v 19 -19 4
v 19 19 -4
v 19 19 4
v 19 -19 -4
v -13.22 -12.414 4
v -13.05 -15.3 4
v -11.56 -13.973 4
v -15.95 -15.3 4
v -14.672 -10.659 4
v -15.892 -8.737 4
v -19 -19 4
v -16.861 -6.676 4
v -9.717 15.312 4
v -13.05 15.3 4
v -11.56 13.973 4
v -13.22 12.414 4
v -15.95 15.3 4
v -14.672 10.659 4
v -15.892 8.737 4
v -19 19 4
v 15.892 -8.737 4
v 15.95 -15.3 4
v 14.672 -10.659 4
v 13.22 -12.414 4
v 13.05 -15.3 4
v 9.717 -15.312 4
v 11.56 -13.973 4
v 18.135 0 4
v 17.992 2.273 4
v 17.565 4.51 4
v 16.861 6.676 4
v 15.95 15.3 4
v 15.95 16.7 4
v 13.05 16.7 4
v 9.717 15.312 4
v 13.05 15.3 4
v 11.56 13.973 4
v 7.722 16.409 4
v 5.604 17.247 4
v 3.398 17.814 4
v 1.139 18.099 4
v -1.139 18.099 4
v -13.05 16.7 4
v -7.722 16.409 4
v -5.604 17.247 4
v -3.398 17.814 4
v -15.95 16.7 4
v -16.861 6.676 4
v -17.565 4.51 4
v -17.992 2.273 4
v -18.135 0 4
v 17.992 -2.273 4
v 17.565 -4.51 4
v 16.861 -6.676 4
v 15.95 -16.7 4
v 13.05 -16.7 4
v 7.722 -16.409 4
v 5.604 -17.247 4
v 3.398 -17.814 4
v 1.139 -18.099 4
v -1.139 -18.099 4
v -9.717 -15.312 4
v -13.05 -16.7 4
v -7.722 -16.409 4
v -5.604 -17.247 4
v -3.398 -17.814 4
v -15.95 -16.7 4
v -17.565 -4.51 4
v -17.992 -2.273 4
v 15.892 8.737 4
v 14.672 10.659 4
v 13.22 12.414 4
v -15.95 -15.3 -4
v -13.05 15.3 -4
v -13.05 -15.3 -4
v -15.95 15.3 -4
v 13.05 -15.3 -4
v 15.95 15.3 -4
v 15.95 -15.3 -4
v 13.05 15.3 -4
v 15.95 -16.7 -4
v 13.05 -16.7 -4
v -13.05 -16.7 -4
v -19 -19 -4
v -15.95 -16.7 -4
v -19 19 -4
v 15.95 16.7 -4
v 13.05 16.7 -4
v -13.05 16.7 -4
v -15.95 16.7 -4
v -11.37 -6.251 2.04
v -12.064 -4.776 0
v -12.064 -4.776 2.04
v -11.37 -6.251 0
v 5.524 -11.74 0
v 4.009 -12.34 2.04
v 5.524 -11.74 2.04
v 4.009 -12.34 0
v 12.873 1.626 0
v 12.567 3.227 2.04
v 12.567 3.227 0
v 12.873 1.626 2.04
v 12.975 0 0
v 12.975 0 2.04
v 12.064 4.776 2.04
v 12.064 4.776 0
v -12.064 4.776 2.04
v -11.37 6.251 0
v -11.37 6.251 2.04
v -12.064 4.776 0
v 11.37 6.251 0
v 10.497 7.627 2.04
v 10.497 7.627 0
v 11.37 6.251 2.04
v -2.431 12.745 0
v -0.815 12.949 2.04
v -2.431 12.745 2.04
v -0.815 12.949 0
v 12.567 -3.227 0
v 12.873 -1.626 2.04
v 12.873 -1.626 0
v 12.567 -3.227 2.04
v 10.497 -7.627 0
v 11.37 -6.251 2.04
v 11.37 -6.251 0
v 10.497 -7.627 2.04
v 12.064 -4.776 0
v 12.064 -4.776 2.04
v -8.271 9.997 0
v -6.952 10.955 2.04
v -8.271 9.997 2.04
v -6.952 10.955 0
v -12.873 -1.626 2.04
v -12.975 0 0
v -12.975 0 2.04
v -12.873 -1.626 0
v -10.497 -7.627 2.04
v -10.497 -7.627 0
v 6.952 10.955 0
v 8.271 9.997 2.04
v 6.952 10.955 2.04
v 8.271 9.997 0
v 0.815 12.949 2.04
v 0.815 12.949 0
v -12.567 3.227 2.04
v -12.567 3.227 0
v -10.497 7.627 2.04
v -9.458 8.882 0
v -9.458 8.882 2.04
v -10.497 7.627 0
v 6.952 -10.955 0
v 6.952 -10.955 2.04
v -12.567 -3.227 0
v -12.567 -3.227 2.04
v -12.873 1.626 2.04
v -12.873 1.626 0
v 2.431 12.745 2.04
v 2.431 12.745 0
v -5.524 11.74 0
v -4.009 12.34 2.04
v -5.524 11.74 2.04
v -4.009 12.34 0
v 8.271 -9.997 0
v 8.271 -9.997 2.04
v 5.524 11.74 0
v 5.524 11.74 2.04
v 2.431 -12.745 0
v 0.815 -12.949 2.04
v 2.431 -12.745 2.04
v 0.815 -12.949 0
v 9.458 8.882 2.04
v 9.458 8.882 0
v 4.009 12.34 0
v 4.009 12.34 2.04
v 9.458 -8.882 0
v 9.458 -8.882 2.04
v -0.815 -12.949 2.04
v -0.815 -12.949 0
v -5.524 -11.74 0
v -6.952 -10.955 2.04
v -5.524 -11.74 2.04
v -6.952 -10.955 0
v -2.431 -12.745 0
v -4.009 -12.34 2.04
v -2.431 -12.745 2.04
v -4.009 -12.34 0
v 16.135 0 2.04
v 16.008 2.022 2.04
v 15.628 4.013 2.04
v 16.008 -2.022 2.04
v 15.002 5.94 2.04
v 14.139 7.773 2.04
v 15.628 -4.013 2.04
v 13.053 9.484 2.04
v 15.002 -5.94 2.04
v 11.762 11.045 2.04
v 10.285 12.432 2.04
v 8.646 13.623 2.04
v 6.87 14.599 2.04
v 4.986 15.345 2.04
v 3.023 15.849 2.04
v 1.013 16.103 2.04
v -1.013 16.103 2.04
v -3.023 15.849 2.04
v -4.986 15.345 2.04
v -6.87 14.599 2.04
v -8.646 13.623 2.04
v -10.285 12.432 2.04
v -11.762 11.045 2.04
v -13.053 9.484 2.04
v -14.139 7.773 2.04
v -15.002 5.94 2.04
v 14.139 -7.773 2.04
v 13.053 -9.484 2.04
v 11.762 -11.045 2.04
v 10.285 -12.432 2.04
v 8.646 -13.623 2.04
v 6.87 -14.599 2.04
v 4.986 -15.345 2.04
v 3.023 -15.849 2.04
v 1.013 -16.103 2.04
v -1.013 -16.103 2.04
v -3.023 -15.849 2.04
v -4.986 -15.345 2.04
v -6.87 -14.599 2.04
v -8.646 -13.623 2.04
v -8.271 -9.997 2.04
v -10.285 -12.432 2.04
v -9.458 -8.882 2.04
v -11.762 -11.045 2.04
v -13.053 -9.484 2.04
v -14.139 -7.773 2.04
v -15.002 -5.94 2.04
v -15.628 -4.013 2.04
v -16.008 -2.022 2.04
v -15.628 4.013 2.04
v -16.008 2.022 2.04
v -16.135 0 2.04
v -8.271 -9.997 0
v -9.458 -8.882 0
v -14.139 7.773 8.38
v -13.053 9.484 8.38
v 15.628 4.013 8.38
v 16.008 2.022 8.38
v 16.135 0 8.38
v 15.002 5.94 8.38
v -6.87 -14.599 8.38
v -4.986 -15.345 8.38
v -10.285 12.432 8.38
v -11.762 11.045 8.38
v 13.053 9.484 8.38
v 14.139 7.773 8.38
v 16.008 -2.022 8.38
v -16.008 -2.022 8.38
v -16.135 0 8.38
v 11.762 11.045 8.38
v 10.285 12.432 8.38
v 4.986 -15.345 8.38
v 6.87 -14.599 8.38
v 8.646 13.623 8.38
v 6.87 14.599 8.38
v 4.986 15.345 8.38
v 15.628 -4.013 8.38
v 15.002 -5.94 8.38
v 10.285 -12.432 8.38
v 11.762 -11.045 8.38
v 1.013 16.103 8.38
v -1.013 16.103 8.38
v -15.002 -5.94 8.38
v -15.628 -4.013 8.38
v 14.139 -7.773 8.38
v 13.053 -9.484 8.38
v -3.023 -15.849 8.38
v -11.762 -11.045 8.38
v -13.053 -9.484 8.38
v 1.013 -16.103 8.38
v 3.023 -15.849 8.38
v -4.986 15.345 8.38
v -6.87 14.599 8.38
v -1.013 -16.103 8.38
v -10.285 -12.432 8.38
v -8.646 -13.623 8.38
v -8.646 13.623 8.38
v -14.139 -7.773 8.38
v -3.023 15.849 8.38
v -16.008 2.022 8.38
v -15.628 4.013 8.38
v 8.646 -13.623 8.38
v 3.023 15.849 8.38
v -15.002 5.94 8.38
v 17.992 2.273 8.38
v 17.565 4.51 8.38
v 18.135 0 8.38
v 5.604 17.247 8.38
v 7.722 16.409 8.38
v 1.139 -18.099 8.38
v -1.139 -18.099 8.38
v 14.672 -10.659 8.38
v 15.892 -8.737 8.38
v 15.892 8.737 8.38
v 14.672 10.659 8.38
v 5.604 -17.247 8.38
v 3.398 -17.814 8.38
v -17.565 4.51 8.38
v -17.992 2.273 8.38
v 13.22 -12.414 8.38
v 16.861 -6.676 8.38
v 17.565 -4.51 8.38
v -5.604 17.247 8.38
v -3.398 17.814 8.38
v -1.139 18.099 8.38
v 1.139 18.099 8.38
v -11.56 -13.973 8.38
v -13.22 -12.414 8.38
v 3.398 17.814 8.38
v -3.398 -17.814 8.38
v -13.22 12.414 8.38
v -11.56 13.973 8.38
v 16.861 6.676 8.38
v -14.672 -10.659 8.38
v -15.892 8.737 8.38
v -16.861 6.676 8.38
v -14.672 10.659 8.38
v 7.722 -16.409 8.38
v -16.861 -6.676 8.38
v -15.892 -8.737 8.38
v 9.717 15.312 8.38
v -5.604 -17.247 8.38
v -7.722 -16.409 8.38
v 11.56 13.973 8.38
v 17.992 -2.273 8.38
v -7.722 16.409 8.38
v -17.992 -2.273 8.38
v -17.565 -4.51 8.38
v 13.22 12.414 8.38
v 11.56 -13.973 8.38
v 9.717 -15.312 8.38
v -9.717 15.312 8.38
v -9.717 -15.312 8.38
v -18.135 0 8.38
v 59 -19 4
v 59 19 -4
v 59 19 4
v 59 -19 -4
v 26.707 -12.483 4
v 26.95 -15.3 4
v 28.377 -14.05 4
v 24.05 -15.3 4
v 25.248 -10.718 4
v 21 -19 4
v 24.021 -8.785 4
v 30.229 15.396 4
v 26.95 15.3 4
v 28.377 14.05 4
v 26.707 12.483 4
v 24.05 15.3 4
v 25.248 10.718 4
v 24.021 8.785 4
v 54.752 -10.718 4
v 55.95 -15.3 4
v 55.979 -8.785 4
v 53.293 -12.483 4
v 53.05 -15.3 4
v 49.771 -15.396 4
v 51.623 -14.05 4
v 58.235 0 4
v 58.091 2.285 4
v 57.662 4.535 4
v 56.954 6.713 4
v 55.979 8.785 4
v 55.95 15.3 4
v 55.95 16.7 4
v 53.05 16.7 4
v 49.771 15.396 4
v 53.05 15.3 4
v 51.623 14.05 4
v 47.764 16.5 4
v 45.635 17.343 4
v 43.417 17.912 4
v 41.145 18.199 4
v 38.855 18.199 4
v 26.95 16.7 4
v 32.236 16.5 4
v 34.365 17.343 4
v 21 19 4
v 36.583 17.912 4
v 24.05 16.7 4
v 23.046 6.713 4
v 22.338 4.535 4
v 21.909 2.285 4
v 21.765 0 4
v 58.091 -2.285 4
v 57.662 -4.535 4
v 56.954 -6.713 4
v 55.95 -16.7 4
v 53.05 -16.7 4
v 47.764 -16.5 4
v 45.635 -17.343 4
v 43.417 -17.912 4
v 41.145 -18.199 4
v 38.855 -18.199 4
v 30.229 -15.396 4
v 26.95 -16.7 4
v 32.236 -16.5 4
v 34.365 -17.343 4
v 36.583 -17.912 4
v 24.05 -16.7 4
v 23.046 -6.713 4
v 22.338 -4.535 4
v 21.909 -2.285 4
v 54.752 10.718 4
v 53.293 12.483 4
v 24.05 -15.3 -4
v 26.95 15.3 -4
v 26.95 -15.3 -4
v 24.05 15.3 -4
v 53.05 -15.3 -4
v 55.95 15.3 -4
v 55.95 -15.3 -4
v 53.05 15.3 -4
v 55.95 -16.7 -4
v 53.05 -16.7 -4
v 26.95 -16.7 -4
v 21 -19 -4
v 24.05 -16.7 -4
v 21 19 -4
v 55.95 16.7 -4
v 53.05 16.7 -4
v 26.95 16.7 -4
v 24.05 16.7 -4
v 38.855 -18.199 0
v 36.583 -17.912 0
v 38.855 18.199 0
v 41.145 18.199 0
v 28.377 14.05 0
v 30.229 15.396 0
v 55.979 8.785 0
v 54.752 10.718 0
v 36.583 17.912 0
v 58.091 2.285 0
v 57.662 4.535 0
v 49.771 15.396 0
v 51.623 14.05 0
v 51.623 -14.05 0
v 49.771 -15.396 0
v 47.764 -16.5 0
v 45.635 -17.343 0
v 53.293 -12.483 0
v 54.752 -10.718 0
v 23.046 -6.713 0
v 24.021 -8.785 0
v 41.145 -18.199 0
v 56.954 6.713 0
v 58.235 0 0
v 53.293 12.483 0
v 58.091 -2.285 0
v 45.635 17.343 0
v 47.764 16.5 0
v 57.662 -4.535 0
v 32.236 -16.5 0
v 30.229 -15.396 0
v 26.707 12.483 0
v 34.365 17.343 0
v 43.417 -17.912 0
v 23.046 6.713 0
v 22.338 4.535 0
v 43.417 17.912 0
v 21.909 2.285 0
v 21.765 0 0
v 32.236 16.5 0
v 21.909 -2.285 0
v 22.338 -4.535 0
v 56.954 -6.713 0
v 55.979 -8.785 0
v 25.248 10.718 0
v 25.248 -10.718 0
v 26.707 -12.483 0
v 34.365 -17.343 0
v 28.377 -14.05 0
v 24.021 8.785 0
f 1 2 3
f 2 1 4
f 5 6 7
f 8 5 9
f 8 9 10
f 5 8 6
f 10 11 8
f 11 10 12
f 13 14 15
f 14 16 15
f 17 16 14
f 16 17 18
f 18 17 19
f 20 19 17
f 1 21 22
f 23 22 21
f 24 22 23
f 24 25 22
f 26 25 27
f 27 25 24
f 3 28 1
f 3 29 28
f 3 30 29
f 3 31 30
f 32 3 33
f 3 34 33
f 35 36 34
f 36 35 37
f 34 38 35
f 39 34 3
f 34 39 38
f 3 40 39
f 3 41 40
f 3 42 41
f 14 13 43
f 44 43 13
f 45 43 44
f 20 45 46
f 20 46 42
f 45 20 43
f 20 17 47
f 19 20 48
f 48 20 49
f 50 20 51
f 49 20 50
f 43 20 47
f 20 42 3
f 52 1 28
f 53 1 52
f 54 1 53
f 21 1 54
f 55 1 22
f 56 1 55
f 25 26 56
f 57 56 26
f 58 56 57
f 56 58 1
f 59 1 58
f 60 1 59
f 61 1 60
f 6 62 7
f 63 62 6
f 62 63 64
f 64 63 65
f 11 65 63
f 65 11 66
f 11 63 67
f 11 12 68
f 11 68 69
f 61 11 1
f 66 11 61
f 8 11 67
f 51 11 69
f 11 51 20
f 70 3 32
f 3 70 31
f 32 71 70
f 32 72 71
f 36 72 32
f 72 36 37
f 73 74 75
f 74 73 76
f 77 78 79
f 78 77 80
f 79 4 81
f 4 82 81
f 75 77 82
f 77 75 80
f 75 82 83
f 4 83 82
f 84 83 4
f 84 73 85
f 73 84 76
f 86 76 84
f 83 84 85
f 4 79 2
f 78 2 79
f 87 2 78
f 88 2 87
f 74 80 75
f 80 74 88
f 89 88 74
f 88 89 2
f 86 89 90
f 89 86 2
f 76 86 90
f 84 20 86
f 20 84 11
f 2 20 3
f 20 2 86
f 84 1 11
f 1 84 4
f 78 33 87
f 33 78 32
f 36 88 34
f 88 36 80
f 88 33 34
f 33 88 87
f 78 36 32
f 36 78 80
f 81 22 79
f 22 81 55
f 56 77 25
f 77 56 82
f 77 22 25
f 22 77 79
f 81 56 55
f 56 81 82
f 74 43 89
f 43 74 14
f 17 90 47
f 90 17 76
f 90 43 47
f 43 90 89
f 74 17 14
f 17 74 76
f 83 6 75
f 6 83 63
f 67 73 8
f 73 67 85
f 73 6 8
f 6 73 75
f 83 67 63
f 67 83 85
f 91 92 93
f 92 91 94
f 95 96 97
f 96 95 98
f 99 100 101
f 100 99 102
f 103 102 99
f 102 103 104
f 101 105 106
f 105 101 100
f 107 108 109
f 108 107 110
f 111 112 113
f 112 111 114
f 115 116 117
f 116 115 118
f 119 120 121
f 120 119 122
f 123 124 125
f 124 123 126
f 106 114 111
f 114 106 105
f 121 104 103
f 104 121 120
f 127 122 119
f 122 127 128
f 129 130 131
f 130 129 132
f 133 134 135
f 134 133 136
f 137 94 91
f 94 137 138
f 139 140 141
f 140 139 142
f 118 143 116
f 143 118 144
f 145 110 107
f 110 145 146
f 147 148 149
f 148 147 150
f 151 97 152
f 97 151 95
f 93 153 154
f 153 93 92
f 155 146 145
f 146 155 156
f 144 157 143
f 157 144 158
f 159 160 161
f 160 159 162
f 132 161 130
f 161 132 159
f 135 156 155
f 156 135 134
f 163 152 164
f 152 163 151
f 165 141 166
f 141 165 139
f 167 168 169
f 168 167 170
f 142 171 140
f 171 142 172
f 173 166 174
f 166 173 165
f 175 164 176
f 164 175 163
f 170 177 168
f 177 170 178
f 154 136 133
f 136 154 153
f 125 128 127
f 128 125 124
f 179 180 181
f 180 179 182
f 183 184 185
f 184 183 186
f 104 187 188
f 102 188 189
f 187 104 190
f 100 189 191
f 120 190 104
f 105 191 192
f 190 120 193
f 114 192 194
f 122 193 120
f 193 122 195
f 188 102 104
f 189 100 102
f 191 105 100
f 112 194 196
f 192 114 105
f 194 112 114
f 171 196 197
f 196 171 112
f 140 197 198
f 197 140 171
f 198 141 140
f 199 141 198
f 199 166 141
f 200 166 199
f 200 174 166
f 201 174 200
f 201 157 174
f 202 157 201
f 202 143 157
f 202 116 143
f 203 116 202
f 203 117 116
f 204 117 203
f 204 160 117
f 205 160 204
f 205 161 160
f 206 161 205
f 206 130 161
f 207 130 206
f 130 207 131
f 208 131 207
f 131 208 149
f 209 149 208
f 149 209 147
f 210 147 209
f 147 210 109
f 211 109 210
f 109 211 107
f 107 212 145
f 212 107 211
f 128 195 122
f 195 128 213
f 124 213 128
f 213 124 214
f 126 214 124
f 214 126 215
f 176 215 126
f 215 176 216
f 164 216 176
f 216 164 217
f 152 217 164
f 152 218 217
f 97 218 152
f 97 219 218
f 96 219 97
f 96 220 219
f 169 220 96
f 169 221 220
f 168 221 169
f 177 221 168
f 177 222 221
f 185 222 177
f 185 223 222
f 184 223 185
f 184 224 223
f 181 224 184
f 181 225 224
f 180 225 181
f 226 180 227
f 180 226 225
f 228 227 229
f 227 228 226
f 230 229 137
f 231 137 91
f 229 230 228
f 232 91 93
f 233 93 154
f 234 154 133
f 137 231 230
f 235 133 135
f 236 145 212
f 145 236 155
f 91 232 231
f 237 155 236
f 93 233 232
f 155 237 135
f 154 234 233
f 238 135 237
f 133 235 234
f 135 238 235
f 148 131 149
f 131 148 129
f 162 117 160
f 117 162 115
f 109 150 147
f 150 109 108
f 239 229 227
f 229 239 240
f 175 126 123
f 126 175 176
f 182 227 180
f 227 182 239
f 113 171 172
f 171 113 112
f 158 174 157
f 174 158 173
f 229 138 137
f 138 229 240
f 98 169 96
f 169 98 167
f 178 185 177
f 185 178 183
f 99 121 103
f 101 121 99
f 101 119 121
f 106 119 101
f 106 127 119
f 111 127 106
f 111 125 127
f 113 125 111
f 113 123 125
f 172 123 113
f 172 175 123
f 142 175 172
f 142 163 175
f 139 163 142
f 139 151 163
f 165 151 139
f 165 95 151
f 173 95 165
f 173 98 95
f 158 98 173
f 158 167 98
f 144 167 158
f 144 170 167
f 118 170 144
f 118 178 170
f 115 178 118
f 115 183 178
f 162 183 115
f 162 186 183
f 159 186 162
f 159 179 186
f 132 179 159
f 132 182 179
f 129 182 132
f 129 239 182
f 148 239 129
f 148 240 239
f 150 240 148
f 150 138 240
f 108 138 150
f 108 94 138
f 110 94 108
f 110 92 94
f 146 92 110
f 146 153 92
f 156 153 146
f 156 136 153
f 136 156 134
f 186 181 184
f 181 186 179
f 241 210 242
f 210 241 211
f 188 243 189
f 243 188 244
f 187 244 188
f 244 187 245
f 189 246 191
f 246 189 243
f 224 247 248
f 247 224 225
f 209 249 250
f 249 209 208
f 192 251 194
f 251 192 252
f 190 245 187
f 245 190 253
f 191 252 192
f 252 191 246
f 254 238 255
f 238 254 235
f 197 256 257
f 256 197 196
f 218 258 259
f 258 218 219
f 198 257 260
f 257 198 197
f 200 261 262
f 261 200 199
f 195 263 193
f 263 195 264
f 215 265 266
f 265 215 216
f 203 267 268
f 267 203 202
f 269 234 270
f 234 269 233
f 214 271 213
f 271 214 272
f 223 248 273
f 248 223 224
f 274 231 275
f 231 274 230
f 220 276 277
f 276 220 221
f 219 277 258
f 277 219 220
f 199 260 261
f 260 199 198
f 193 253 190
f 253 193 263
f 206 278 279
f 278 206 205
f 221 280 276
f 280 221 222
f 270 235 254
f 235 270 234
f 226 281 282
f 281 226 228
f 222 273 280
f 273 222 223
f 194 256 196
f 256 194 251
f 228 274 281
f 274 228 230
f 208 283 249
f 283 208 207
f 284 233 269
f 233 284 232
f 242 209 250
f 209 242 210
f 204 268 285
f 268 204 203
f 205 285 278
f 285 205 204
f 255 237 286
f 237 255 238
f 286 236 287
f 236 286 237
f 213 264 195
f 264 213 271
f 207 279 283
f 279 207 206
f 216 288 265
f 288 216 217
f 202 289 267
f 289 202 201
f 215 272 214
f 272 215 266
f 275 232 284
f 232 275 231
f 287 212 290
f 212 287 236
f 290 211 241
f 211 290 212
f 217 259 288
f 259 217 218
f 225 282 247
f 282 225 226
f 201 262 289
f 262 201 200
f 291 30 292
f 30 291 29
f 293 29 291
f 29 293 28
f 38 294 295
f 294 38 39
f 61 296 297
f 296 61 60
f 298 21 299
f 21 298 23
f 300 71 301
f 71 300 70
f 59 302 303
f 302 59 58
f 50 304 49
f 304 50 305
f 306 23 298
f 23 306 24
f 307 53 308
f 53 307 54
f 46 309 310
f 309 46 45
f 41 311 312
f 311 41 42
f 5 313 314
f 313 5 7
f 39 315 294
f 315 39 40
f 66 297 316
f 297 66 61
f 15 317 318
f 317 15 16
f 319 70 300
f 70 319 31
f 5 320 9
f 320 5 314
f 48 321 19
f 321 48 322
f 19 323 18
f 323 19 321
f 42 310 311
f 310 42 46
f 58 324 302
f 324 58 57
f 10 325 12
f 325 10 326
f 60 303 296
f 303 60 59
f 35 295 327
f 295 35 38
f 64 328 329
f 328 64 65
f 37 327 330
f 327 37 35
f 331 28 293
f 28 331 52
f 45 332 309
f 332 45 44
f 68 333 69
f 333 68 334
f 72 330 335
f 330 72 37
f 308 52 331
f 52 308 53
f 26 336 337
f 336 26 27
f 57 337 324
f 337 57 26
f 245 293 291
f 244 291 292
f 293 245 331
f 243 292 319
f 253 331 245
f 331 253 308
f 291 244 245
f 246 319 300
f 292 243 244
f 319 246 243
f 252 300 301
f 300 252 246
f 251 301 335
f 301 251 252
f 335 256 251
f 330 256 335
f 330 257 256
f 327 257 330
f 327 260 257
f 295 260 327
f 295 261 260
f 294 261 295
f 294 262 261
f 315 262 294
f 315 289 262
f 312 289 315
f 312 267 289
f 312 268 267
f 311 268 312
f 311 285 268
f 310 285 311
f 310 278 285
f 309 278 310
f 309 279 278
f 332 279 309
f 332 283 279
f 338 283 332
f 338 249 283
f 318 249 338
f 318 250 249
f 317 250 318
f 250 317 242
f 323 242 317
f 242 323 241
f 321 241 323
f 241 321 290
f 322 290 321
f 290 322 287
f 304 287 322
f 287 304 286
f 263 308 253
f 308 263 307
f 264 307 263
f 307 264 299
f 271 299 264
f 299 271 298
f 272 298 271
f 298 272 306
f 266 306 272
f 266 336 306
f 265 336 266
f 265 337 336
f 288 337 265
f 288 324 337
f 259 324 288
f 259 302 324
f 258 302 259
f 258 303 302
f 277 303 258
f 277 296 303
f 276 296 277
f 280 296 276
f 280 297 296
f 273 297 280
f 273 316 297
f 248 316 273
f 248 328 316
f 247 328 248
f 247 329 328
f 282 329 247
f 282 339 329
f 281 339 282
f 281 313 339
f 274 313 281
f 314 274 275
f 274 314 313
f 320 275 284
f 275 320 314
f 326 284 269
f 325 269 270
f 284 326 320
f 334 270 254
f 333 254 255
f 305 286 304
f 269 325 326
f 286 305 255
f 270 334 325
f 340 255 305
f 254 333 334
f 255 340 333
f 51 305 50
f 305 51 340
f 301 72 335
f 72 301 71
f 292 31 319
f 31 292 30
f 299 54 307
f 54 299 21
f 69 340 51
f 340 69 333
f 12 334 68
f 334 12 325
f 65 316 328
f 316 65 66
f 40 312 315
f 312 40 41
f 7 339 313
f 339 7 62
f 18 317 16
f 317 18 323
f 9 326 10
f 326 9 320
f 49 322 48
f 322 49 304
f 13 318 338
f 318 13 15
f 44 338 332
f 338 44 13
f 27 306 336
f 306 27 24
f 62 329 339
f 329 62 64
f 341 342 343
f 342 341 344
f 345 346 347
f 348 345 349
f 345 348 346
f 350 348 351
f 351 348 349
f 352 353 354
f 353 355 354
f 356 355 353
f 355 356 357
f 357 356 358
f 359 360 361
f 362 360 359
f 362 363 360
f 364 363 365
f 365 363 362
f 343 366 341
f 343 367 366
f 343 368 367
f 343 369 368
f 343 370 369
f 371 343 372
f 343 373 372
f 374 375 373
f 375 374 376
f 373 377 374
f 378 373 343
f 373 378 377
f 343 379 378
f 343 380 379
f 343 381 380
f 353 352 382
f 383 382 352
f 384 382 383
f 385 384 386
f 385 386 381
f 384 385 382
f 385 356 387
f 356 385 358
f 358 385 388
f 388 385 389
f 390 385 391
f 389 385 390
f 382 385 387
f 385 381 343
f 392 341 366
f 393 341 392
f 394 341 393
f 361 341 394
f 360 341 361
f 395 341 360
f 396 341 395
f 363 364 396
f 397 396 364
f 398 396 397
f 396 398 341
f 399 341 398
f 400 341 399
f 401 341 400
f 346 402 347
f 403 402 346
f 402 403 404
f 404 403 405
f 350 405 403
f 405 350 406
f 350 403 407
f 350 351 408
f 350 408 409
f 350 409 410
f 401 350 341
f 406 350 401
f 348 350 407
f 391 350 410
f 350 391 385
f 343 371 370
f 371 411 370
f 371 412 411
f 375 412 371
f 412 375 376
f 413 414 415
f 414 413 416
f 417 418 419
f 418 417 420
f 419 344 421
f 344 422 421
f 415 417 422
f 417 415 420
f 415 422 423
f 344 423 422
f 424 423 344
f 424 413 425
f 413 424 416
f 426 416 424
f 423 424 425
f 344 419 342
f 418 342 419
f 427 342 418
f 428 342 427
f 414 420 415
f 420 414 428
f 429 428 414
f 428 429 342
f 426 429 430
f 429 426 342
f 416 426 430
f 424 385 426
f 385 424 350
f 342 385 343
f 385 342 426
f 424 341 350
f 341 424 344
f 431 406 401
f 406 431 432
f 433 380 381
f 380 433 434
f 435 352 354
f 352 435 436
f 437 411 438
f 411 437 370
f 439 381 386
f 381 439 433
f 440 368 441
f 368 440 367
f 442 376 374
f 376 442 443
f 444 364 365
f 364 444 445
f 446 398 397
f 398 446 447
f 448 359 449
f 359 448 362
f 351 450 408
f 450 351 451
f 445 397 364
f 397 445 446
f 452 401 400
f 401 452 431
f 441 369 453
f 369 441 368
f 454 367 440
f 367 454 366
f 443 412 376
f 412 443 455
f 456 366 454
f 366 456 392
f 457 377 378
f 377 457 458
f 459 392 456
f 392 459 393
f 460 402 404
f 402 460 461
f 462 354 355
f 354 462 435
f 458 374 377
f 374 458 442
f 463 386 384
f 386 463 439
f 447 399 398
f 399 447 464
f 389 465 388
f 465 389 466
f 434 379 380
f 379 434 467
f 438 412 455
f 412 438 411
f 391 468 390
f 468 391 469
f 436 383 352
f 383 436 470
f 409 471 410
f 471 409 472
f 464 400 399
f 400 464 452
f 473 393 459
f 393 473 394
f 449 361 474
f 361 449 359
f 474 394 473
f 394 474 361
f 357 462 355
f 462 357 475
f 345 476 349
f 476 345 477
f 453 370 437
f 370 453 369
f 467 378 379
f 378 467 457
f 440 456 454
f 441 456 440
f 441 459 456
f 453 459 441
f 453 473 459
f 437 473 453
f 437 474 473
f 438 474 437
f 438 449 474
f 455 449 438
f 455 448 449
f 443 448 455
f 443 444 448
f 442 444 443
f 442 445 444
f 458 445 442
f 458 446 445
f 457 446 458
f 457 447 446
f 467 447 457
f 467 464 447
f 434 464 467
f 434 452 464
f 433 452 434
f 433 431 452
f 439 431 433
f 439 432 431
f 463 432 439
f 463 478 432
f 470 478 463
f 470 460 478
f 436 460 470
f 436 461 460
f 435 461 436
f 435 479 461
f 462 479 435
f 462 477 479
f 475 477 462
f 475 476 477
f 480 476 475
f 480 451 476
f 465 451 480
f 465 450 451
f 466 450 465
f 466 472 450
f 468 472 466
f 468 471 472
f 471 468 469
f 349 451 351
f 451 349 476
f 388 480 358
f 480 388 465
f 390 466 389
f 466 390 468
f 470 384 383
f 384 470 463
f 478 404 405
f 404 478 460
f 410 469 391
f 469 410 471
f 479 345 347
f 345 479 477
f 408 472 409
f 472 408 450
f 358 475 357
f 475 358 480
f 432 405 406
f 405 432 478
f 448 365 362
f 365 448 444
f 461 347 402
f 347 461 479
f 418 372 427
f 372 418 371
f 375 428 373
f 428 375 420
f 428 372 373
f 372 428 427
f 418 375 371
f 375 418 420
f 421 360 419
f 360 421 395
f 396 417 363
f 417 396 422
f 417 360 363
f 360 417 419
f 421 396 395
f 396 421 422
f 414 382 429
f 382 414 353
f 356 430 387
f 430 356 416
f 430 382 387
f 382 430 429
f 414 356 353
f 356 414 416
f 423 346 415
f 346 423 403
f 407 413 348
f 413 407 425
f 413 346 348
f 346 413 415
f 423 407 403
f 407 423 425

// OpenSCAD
ziptie_width = 2.5;
ziptie_thickness = 1;

$fn=50;

difference(){
    difference(){
        cube([38,38,8], true);
        
        translate([38/2-4.5,38/2-3]) cube([ziptie_width+0.4, ziptie_thickness+0.4, 10], true);
        translate([38/2-4.5,-38/2+3]) cube([ziptie_width+0.4, ziptie_thickness+0.4, 10], true);
        translate([-38/2+4.5,38/2-3]) cube([ziptie_width+0.4, ziptie_thickness+0.4, 10], true);
        translate([-38/2+4.5,-38/2+3]) cube([ziptie_width+0.4, ziptie_thickness+0.4, 10], true);
    }
    #cylinder(h=1.84+0.2, d=25.55 + 0.4);
    #translate([0,0,1.84+0.2])cylinder(h=7.98-1.84+0.2, d=31.87 + 0.4);
}

difference(){
    cylinder(h=7.98+0.4, d=31.87 + 0.4 + 4);
    cylinder(h=7.98+0.4, d=31.87 + 0.4);
    
    
}

translate([40,0,0]) difference(){
    cube([38,38,8], true);
    cylinder(h=7.98+0.4, d=31.87 + 0.4 + 4 + 0.2);
    translate([38/2-4.5,38/2-3]) cube([ziptie_width+0.4, ziptie_thickness+0.4, 10], true);
    translate([38/2-4.5,-38/2+3]) cube([ziptie_width+0.4, ziptie_thickness+0.4, 10], true);
    translate([-38/2+4.5,38/2-3]) cube([ziptie_width+0.4, ziptie_thickness+0.4, 10], true);
    translate([-38/2+4.5,-38/2+3]) cube([ziptie_width+0.4, ziptie_thickness+0.4, 10], true);
}
